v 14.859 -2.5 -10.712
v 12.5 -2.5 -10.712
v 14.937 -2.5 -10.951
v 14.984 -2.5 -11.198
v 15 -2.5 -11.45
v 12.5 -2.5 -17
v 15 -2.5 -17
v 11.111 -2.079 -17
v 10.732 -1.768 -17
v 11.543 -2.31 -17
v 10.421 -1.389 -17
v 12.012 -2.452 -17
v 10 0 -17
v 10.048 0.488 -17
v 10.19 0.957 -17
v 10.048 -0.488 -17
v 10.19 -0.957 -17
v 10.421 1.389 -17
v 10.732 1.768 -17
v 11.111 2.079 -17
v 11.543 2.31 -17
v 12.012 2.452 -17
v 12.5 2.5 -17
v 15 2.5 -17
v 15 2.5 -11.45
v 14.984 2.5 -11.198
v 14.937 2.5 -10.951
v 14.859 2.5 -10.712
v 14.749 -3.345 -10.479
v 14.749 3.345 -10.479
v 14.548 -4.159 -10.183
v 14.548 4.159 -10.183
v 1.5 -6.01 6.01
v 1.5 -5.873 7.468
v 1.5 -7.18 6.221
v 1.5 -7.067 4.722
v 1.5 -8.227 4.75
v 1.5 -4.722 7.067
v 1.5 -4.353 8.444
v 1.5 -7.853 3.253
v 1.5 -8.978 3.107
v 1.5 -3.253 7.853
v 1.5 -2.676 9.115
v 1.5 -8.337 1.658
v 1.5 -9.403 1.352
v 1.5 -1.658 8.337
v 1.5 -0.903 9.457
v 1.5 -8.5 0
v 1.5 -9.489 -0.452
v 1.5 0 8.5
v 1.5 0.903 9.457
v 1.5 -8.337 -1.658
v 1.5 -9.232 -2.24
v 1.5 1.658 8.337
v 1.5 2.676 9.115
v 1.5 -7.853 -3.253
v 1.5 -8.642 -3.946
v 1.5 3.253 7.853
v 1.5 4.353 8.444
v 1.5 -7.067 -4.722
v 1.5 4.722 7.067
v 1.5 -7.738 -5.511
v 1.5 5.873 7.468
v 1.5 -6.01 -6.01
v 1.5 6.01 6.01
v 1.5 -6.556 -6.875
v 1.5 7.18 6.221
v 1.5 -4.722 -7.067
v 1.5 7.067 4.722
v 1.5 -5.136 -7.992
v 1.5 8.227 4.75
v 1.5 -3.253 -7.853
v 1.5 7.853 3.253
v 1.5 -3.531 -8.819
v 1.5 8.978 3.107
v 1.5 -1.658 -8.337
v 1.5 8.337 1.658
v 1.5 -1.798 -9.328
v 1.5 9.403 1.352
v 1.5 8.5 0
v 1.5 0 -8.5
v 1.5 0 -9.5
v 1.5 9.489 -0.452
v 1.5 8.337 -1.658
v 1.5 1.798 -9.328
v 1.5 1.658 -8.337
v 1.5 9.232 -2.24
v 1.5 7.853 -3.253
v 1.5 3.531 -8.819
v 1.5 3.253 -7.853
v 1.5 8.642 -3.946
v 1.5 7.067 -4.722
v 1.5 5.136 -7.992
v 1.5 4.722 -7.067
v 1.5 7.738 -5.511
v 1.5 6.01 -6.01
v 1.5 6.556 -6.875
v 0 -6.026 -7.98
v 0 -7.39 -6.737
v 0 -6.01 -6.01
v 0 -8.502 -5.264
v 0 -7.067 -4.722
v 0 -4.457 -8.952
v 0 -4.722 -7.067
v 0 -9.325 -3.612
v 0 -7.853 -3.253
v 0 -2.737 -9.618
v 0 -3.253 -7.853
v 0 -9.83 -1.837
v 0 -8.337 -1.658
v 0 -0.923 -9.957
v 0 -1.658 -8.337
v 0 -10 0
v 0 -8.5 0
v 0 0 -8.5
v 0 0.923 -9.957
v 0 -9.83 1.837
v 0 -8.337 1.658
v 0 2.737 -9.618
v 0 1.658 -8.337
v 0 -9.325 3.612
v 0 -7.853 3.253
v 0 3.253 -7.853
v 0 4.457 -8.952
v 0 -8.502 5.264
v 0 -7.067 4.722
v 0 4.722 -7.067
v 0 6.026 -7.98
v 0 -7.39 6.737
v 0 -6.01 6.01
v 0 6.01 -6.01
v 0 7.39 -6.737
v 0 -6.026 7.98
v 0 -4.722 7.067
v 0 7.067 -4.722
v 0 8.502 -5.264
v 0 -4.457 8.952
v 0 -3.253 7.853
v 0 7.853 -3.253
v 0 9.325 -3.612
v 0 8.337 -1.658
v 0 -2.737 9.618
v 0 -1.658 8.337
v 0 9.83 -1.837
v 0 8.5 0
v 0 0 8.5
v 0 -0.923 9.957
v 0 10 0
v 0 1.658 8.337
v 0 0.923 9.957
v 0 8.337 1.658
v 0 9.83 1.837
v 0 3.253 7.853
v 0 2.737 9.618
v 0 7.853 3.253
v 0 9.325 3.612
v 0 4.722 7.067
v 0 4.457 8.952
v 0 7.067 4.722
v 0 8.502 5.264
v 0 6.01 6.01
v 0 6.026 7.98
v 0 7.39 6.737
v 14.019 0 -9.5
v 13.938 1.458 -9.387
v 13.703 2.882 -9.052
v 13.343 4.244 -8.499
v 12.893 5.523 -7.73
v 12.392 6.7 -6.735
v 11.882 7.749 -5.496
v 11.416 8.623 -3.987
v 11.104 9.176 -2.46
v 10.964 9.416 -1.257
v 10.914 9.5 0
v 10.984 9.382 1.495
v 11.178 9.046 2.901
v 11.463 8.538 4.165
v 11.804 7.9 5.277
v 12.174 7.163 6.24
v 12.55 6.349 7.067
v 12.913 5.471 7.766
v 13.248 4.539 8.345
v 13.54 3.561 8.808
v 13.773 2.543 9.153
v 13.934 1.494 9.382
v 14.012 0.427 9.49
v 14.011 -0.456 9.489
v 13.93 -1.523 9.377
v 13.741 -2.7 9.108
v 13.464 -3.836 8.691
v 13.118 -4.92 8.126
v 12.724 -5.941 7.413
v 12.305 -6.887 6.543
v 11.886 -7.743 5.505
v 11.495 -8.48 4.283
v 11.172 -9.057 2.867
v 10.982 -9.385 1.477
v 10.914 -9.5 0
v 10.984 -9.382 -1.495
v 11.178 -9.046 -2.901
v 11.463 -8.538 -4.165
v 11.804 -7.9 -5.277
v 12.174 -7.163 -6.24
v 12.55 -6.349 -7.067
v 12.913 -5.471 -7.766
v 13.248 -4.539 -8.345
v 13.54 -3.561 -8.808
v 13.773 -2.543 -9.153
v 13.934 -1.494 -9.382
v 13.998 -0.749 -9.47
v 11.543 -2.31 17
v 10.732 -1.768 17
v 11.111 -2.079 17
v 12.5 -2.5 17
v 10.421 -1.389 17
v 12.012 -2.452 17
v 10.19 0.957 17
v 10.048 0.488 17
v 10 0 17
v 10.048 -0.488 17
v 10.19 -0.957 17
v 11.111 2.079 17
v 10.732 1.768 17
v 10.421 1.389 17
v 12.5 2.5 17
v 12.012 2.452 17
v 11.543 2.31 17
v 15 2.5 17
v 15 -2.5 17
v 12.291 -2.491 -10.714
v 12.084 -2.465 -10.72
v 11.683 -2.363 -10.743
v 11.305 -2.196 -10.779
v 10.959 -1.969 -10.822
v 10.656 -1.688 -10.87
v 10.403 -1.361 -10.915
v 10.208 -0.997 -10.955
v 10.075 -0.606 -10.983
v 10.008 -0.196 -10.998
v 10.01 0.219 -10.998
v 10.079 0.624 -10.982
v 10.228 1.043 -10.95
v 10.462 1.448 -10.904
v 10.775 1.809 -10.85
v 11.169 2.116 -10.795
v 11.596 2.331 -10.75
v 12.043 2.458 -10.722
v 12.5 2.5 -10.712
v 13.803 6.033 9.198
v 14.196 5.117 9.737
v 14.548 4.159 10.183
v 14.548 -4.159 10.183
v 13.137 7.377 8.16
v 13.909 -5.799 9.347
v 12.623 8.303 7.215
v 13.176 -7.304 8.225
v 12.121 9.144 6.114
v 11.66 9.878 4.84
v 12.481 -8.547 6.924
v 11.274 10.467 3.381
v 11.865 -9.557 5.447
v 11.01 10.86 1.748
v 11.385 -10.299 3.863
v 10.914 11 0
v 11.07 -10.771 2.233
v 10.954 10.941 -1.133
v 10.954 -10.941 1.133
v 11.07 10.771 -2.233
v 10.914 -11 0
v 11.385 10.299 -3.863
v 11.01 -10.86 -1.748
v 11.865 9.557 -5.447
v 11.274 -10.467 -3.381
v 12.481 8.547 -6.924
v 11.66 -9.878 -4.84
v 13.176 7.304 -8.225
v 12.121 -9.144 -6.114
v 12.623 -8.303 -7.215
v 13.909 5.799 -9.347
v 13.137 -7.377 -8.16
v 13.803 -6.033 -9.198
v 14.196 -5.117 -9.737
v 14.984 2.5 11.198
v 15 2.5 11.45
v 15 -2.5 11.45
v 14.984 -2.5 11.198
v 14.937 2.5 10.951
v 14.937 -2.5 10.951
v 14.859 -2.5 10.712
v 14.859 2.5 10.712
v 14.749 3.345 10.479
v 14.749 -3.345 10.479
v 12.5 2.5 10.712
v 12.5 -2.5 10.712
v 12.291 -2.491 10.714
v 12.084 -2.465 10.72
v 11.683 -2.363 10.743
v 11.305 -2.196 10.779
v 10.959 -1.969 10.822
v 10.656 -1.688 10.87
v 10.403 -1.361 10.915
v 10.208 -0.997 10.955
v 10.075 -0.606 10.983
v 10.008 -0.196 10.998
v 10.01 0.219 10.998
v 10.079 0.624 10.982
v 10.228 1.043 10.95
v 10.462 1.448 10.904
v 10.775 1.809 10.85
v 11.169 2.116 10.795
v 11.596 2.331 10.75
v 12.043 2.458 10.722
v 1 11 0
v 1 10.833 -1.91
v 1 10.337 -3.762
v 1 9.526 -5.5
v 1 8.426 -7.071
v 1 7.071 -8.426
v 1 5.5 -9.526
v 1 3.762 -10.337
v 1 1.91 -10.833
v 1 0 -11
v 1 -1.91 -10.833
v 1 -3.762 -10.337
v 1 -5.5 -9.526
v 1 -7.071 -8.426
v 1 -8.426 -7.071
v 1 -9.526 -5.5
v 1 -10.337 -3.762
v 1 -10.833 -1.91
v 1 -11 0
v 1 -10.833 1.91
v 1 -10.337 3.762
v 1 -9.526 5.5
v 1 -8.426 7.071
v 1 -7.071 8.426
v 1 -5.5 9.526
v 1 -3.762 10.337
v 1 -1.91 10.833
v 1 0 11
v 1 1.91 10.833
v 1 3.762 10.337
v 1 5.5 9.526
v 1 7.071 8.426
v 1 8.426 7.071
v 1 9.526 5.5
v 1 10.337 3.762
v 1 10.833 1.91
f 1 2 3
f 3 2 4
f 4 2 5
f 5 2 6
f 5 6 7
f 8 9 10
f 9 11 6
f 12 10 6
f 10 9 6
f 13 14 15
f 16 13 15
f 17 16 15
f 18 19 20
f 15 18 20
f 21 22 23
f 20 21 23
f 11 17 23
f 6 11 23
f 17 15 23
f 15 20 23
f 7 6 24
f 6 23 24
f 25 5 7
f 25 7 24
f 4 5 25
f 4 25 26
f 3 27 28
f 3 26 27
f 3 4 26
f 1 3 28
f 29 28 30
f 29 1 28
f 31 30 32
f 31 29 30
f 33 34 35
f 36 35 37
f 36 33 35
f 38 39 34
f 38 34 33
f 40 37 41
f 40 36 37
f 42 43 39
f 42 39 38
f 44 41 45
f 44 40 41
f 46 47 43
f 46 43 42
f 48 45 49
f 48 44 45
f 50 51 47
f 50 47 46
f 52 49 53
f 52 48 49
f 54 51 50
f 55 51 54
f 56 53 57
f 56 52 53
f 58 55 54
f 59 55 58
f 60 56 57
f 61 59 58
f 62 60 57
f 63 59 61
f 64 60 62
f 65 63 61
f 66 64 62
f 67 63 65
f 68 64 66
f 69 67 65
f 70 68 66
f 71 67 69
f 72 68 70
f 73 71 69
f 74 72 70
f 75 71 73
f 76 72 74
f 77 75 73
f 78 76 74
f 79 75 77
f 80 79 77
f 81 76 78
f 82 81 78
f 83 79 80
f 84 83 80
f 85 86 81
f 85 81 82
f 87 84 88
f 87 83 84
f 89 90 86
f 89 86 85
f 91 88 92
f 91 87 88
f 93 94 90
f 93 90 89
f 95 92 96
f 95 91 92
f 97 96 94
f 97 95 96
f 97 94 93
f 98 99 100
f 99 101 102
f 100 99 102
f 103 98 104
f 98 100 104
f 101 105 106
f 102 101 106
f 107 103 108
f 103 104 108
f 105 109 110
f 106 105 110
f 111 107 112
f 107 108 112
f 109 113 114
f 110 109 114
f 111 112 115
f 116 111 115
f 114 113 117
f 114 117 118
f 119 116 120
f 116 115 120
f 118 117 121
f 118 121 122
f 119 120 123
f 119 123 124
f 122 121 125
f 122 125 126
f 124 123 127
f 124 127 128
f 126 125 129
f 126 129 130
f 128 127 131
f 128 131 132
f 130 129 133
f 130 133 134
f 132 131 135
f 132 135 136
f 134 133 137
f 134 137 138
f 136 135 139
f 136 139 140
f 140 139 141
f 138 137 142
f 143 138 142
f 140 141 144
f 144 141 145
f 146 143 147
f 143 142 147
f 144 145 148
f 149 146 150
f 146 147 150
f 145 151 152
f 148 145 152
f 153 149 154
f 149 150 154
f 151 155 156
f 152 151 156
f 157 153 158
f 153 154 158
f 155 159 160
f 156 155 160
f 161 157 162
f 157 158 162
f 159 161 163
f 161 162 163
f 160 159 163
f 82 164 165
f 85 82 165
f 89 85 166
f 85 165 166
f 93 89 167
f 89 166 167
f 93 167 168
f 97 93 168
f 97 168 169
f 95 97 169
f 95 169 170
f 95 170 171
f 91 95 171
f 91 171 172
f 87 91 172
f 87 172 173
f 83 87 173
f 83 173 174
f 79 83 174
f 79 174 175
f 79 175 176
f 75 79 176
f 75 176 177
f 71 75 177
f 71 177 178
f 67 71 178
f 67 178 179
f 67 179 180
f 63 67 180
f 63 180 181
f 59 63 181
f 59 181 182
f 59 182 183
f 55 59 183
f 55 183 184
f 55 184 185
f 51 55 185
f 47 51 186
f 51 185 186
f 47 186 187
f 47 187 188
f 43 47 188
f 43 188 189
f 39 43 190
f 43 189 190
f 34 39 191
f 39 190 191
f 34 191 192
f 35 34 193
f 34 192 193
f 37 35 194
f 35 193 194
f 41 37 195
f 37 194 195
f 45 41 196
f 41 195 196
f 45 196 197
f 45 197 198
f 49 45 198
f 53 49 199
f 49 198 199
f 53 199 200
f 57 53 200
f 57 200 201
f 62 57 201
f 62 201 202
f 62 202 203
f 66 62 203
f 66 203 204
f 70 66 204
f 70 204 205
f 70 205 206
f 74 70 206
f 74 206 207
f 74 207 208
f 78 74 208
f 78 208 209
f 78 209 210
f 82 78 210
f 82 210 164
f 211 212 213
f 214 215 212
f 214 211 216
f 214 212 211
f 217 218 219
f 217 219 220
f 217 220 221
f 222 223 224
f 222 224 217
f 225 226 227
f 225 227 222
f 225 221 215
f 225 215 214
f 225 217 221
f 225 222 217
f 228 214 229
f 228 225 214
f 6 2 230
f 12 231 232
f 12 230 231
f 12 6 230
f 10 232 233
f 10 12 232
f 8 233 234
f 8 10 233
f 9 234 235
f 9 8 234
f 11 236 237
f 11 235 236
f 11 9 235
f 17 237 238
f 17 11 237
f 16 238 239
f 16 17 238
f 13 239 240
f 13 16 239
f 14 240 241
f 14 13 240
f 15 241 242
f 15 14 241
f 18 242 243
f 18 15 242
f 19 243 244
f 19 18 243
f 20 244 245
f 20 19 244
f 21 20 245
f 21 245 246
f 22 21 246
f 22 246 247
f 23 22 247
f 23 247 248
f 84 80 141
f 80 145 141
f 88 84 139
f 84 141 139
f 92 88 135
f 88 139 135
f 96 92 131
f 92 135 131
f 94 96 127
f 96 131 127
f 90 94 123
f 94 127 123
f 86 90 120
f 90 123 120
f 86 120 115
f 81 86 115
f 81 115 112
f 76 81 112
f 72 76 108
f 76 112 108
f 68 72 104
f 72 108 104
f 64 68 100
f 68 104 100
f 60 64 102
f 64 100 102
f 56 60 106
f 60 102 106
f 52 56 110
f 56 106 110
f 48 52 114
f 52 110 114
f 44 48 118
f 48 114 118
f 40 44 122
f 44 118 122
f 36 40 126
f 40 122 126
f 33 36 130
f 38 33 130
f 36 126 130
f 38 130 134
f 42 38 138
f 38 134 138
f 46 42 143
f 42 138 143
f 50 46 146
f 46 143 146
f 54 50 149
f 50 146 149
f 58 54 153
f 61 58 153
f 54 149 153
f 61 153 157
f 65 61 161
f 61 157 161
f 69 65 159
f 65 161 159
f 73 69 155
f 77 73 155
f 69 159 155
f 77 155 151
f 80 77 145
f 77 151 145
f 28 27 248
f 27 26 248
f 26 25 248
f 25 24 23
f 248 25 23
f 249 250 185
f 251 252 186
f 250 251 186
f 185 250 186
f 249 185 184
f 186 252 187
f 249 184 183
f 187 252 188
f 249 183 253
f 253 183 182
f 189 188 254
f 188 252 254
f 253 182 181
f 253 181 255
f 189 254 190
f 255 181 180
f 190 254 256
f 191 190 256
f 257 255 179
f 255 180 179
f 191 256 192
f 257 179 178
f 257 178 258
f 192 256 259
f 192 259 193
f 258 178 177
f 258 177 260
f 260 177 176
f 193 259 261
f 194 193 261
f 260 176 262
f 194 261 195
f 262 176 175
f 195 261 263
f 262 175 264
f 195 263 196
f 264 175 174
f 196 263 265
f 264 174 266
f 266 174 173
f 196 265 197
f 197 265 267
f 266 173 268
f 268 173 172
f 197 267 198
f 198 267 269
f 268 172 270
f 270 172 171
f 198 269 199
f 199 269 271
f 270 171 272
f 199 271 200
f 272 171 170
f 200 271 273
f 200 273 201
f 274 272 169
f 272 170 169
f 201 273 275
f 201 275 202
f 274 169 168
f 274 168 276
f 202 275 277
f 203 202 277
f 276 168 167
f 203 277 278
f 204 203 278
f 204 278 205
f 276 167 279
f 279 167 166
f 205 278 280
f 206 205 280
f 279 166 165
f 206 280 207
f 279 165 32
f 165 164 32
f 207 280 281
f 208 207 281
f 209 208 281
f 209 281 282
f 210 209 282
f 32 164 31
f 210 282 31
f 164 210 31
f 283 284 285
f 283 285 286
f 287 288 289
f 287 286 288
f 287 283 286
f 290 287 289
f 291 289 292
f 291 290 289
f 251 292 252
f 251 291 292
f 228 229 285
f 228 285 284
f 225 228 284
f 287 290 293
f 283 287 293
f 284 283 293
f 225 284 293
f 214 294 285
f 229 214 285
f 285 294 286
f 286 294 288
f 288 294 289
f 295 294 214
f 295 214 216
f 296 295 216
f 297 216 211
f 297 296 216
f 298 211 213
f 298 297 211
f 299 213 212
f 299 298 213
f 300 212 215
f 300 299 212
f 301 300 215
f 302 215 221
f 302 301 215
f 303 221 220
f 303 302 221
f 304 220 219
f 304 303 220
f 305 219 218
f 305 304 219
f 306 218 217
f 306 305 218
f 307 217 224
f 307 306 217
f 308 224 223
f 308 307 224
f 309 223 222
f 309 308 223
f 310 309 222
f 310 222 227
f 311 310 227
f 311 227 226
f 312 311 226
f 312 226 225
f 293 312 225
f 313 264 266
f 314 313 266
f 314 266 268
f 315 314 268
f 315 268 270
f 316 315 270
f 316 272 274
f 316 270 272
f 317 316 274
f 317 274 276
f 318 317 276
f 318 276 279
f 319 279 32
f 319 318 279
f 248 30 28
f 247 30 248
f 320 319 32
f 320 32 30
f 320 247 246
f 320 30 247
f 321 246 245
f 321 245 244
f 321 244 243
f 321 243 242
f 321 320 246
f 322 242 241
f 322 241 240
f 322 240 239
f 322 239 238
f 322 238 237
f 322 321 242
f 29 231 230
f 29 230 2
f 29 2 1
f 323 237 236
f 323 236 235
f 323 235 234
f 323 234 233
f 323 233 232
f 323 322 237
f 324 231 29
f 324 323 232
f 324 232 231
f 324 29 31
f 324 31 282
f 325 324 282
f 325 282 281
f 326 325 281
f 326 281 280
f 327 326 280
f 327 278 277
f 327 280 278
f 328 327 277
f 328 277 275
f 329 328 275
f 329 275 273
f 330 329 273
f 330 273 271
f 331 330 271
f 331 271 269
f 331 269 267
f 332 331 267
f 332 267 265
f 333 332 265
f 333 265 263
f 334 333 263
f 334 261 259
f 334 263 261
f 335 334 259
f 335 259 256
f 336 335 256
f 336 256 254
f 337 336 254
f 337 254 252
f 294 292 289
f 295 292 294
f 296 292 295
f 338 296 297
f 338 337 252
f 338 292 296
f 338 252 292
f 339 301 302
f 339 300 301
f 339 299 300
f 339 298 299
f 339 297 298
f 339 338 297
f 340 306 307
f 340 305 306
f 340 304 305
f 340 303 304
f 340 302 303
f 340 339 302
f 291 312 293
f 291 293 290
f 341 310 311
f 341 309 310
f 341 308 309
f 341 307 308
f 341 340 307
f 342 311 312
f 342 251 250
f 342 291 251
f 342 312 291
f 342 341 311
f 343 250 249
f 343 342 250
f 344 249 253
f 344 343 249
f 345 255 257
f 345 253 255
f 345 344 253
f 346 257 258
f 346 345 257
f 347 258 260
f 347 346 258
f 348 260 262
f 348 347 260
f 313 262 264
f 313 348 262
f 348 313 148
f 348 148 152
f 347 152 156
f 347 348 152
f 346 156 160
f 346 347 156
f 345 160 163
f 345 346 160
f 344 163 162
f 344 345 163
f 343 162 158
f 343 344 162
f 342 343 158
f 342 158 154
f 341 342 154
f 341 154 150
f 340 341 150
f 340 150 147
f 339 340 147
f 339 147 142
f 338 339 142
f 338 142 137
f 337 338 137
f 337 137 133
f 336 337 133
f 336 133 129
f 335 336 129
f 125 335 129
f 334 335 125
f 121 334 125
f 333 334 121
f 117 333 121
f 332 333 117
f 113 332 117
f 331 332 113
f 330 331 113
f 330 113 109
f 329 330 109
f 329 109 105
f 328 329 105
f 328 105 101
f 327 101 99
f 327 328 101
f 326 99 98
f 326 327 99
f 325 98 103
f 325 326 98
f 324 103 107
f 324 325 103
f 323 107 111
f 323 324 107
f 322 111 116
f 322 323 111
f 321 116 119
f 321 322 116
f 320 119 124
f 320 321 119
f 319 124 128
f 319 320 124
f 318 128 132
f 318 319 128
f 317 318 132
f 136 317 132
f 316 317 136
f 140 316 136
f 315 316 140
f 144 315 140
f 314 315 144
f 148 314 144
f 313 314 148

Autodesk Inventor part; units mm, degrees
ref_plane "YZ Plane" through (0, 0, 0) normal (1, 0, 0) x (0, 1, 0)
ref_plane "XZ Plane" through (0, 0, 0) normal (0, 1, 0) x (-1, 0, 0)
ref_plane "XY Plane" through (0, 0, 0) normal (0, 0, 1) x (1, 0, 0)
sketch "Sketch1" plane through (0, 0, 0) normal (1, 0, 0) x (0, 1, 0)
  circle A0 centre (0, 0) radius 11
  circle A1 centre (0, 0) radius 8.5
  dimension "d0" = 22
  dimension "d3" = 17
extrude "Extrusion1" add sketch "Sketch1" along normal blind 15
sketch "Sketch2" plane through (0, 0, 0) normal (0, 0, 1) x (1, 0, 0)
  line L0 (17.5, 2.5) -> (12.5, 2.5)
  line L1 (12.5, 2.5) -> (12.5, -2.5)
  line L2 (12.5, -2.5) -> (17.5, -2.5)
  line L3 (17.5, -2.5) -> (17.5, 2.5)
  line L4 (15, -11) -> (15, 11) projected
  line L5 (17.5, 2.5) -> (12.5, -2.5) construction
  line L6 (12.5, 2.5) -> (17.5, -2.5) construction
  circle A0 centre (12.5, 0) radius 2.5
  point P0 (0, 0)
  point P1 (15, 0)
  point P2 (15, -2.5)
  point P3 (15, 2.5)
  dimension "d4" = 5
  dimension "d5" = 5
extrude "Extrusion2" add sketch "Sketch2" along normal mid plane 34 contours L4 A0 L0 | A0 L1 | L1 A0 | L4 L2 A0
sketch "Sketch3" plane through (15, 0, 0) normal (1, 0, 0) x (0, 0, -1)
  circle A0 centre (0, 0) radius 9.5
  dimension "d8" = 19
extrude "Extrusion3" cut sketch "Sketch3" against normal blind 13.5
chamfer "Chamfer1" distance 1 angle 45 1 edges at (0, -11, 0)
sketch "Sketch4" plane through (0, 0, 0) normal (0, 1, 0) x (-1, 0, 0)
  line L0 (-15, 10.7121) -> (-15, -10.7121) projected
  circle A0 centre (-27, 0) radius 16.0857
  line L1 (-15, 0) -> (-27, 0) construction
  point P0 (0, 0)
  dimension "d14" = 12
extrude "Extrusion4" cut sketch "Sketch4" along normal through all both and the other way through all contours A0 L0 picked at (-13.6381, 0)
fillet "Fillet1" radius 2 2 edges at (15, 0, -10.7121) (15, 0, 10.7121)
properties part number "Cup" material "Aluminum 6061"
